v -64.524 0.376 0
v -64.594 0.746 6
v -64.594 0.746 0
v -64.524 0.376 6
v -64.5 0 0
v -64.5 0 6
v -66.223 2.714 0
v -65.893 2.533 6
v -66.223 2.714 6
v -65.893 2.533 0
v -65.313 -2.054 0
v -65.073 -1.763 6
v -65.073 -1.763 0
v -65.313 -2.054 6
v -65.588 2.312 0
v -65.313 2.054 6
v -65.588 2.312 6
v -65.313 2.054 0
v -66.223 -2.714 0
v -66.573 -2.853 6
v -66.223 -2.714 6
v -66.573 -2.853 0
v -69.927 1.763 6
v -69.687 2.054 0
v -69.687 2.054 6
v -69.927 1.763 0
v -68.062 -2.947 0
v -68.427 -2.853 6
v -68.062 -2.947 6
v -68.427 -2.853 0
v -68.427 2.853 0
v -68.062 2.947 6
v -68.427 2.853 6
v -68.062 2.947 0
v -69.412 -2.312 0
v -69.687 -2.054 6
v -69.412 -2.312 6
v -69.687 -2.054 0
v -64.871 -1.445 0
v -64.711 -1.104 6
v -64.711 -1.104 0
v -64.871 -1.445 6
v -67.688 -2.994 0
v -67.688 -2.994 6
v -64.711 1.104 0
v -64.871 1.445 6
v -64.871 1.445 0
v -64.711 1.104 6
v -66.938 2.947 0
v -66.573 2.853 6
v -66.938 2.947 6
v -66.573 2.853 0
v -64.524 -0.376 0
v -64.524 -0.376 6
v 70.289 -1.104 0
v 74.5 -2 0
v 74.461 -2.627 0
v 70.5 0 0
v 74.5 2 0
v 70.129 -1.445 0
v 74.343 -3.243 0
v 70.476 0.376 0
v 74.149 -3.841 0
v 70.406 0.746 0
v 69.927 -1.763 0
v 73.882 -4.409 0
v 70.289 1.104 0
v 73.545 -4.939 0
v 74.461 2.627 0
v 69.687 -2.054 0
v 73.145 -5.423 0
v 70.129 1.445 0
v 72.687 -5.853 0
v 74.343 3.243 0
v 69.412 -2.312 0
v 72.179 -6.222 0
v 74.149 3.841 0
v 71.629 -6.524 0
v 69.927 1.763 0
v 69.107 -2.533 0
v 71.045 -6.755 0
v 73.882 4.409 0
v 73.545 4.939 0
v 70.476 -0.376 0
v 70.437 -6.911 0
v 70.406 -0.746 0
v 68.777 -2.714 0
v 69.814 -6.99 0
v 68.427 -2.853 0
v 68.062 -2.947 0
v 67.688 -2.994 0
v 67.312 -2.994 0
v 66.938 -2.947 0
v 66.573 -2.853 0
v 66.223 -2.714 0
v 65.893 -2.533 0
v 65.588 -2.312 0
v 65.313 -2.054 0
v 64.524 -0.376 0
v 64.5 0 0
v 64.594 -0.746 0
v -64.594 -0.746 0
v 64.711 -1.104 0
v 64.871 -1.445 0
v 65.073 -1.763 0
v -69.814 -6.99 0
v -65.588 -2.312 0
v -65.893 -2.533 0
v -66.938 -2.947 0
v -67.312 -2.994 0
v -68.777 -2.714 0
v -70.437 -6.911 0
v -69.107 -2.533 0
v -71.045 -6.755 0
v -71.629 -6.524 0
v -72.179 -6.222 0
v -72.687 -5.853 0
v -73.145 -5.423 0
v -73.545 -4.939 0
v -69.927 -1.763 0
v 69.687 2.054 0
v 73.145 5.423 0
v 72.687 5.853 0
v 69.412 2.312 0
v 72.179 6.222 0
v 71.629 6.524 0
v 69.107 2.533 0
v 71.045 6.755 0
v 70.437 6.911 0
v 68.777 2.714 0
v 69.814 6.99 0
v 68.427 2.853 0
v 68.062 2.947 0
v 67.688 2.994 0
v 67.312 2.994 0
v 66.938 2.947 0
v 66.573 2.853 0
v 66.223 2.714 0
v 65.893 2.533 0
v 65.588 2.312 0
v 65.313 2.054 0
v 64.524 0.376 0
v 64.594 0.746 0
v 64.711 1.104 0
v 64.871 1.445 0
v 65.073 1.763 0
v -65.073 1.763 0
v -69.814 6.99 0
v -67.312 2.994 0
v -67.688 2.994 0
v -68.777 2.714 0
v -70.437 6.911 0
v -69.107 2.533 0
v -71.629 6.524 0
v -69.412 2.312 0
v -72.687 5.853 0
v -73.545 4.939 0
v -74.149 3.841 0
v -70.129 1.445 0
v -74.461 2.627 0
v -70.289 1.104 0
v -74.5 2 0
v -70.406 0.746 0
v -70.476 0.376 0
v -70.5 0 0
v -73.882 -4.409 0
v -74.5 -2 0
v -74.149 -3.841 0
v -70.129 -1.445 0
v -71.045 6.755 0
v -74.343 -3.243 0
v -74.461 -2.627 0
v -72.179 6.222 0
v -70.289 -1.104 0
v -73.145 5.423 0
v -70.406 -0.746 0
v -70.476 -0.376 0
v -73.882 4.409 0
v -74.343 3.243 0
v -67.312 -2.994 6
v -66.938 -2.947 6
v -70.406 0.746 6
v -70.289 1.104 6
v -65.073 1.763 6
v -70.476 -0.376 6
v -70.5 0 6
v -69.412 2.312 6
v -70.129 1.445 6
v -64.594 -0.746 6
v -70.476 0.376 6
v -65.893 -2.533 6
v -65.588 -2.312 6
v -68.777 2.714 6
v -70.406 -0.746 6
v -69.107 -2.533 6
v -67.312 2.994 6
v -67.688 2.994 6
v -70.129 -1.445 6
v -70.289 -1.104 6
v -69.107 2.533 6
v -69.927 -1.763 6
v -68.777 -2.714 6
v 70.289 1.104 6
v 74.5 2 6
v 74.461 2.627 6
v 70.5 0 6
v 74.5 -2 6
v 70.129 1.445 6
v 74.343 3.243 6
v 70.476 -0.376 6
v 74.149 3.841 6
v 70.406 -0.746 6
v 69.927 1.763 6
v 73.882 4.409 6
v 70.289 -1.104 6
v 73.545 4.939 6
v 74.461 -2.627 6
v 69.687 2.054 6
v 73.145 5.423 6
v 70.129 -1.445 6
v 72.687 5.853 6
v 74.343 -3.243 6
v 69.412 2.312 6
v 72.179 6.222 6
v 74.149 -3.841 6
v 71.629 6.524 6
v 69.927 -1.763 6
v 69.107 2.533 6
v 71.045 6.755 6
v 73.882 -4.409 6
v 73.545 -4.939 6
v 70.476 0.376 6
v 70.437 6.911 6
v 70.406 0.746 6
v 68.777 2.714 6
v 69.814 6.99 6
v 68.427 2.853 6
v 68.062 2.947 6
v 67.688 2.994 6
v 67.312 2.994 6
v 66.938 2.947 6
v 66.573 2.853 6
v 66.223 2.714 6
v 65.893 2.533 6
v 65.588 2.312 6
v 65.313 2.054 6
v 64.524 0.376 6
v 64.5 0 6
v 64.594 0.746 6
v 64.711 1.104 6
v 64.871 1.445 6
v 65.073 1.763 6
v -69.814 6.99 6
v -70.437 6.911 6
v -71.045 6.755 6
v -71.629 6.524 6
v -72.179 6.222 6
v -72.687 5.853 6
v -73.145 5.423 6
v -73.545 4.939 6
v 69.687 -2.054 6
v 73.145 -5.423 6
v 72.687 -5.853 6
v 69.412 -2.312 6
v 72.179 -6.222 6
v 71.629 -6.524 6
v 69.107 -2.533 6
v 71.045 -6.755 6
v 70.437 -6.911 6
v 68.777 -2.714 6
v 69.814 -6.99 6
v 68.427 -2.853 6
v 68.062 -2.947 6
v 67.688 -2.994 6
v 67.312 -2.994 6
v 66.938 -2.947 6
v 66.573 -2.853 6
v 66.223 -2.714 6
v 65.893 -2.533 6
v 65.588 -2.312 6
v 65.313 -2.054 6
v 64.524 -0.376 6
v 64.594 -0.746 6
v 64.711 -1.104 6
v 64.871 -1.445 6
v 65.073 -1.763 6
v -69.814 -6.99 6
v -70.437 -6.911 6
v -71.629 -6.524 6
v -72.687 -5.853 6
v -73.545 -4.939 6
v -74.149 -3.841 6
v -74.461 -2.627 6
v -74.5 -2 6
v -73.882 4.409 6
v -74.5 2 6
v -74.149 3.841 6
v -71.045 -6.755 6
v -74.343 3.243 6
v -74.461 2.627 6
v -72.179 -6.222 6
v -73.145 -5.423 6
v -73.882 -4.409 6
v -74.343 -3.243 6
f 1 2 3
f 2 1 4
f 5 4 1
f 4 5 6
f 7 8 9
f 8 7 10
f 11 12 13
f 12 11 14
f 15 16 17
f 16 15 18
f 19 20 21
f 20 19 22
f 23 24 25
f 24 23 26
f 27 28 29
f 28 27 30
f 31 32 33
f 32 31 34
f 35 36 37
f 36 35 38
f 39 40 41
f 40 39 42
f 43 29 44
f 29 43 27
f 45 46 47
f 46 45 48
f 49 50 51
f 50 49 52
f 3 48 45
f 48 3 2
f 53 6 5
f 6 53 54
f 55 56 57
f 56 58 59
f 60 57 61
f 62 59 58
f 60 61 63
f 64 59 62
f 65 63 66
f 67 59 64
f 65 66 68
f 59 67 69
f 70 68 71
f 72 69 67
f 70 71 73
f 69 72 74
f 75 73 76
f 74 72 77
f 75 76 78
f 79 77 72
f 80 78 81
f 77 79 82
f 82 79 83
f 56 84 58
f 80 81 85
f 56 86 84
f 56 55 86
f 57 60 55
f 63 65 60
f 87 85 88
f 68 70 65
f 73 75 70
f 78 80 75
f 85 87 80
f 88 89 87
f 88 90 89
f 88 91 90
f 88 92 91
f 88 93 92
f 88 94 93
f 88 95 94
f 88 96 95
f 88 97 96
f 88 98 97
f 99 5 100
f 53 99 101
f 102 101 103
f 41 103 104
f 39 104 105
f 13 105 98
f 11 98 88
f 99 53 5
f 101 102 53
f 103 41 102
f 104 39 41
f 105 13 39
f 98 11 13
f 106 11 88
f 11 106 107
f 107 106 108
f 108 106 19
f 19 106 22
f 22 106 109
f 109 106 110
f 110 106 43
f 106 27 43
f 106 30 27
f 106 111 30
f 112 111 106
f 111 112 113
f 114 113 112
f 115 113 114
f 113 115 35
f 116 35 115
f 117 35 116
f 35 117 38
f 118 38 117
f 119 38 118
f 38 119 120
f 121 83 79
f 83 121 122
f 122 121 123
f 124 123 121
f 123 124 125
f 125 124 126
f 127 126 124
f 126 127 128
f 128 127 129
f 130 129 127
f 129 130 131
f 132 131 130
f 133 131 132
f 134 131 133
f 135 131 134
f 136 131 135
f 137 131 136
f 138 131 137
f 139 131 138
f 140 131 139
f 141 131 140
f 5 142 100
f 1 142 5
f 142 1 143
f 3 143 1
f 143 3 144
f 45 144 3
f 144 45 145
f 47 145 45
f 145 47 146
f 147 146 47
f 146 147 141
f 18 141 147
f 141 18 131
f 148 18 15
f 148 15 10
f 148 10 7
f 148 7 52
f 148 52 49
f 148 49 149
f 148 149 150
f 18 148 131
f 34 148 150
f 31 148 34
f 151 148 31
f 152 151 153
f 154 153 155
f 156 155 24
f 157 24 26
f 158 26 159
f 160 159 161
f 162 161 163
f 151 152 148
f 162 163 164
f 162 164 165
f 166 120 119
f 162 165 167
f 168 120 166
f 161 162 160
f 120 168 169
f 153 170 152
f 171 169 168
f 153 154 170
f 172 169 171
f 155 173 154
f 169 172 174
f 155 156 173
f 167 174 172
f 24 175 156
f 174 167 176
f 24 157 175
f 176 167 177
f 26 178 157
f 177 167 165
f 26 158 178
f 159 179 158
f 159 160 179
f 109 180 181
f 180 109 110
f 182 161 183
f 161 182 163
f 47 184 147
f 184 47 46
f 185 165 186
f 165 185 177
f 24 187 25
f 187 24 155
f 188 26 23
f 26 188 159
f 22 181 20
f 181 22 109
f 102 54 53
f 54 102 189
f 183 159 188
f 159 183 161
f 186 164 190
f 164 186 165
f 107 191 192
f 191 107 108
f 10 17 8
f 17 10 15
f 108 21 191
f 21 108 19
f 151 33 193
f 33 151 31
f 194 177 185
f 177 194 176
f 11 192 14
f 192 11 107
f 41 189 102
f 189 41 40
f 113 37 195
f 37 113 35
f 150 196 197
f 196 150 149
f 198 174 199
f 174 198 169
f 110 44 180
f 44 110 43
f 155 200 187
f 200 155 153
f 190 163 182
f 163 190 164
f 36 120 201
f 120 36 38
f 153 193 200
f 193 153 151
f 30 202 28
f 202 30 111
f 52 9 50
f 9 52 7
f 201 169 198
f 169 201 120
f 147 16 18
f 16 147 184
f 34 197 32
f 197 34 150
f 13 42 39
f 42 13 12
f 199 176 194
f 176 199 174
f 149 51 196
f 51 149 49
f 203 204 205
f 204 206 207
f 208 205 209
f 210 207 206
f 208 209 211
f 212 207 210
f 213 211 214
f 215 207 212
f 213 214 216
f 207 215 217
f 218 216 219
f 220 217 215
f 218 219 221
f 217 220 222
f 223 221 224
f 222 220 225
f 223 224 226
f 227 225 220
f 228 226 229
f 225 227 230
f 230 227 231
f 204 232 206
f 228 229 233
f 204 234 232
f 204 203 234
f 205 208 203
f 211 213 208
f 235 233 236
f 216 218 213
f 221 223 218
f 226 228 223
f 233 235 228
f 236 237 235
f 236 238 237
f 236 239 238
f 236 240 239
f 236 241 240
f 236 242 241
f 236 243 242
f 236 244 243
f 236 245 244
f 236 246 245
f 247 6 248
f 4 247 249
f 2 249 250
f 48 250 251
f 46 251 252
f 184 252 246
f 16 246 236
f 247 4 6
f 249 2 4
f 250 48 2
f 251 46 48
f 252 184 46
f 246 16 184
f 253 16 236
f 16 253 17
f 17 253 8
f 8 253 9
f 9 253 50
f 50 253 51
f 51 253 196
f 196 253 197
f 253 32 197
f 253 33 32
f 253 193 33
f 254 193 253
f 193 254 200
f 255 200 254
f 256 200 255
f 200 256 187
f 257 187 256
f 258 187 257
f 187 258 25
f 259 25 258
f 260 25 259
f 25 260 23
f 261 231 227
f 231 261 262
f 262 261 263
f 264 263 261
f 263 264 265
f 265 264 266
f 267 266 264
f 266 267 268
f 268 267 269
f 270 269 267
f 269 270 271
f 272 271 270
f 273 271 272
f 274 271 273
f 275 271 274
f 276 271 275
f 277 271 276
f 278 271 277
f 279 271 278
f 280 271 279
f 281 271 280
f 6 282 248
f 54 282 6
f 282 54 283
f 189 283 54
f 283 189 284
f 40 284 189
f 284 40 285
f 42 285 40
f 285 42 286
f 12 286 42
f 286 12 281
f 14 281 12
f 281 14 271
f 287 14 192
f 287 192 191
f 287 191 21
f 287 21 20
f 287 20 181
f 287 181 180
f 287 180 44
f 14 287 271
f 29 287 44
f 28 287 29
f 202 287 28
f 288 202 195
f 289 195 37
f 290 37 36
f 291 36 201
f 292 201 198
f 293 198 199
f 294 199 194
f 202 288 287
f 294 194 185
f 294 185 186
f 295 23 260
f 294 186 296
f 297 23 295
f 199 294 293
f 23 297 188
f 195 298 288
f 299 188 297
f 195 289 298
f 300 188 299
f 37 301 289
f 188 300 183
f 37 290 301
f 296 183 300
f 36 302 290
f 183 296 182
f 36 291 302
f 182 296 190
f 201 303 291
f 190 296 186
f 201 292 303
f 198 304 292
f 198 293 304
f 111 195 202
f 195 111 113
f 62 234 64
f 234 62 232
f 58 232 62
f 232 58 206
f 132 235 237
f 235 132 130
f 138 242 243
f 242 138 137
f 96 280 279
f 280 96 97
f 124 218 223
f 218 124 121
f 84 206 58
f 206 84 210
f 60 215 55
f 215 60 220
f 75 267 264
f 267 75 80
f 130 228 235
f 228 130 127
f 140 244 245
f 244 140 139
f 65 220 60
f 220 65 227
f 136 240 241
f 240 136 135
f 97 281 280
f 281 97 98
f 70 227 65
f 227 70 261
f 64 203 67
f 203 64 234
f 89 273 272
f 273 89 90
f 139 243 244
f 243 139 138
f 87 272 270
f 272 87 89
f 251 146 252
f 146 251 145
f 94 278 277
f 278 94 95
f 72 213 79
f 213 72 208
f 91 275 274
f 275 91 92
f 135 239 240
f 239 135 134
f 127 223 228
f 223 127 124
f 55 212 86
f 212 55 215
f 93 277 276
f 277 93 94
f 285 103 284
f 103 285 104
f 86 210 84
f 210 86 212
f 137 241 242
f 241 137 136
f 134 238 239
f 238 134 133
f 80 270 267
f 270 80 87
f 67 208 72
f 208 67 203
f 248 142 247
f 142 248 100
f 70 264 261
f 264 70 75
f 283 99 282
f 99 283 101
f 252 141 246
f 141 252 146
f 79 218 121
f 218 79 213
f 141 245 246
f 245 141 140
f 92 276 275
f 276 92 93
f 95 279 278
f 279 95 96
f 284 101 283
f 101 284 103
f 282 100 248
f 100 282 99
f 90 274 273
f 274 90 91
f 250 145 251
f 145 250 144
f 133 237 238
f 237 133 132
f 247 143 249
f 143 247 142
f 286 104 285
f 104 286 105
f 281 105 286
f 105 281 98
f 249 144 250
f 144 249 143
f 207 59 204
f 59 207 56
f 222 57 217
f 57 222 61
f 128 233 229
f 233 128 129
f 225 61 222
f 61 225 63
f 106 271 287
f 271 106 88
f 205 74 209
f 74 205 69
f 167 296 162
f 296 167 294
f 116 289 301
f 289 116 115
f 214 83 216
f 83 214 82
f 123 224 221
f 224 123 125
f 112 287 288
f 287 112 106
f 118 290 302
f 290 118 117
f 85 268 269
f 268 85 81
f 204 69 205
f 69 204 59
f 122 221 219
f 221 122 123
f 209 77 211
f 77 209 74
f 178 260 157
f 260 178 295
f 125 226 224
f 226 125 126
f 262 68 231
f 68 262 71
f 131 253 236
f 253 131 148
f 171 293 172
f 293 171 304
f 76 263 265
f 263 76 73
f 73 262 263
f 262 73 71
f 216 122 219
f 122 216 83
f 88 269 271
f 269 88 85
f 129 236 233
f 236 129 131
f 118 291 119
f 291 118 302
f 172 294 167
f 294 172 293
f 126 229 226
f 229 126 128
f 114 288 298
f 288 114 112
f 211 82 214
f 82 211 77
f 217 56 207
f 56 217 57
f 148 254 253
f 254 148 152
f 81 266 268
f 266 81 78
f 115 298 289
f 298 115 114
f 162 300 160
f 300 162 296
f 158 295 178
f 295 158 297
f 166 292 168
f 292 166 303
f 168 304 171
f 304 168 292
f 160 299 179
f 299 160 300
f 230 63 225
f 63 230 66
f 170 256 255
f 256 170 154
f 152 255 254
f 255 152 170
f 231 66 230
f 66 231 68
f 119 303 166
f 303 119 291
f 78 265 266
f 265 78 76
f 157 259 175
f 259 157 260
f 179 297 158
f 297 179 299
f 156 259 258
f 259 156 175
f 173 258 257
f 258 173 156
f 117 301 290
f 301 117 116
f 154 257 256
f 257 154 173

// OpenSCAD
$fn = 50;


difference() {
	union() {
		hull() {
			translate(v = [-69.5000000000, 2.0000000000, 0]) {
				cylinder(h = 6, r = 5);
			}
			translate(v = [69.5000000000, 2.0000000000, 0]) {
				cylinder(h = 6, r = 5);
			}
			translate(v = [-69.5000000000, -2.0000000000, 0]) {
				cylinder(h = 6, r = 5);
			}
			translate(v = [69.5000000000, -2.0000000000, 0]) {
				cylinder(h = 6, r = 5);
			}
		}
	}
	union() {
		translate(v = [-67.5000000000, 0.0000000000, 0]) {
			cylinder(h = 6, r = 3.0000000000);
		}
		translate(v = [67.5000000000, 0.0000000000, 0]) {
			cylinder(h = 6, r = 3.0000000000);
		}
		translate(v = [-67.5000000000, 0.0000000000, 0]) {
			cylinder(h = 6, r = 1.5000000000);
		}
		translate(v = [67.5000000000, 0.0000000000, 0]) {
			cylinder(h = 6, r = 1.5000000000);
		}
		translate(v = [-67.5000000000, 0.0000000000, 0]) {
			cylinder(h = 6, r = 1.5000000000);
		}
		translate(v = [67.5000000000, 0.0000000000, 0]) {
			cylinder(h = 6, r = 1.5000000000);
		}
		translate(v = [-67.5000000000, 0.0000000000, 0]) {
			cylinder(h = 6, r = 1.5000000000);
		}
		translate(v = [67.5000000000, 0.0000000000, 0]) {
			cylinder(h = 6, r = 1.5000000000);
		}
	}
}
